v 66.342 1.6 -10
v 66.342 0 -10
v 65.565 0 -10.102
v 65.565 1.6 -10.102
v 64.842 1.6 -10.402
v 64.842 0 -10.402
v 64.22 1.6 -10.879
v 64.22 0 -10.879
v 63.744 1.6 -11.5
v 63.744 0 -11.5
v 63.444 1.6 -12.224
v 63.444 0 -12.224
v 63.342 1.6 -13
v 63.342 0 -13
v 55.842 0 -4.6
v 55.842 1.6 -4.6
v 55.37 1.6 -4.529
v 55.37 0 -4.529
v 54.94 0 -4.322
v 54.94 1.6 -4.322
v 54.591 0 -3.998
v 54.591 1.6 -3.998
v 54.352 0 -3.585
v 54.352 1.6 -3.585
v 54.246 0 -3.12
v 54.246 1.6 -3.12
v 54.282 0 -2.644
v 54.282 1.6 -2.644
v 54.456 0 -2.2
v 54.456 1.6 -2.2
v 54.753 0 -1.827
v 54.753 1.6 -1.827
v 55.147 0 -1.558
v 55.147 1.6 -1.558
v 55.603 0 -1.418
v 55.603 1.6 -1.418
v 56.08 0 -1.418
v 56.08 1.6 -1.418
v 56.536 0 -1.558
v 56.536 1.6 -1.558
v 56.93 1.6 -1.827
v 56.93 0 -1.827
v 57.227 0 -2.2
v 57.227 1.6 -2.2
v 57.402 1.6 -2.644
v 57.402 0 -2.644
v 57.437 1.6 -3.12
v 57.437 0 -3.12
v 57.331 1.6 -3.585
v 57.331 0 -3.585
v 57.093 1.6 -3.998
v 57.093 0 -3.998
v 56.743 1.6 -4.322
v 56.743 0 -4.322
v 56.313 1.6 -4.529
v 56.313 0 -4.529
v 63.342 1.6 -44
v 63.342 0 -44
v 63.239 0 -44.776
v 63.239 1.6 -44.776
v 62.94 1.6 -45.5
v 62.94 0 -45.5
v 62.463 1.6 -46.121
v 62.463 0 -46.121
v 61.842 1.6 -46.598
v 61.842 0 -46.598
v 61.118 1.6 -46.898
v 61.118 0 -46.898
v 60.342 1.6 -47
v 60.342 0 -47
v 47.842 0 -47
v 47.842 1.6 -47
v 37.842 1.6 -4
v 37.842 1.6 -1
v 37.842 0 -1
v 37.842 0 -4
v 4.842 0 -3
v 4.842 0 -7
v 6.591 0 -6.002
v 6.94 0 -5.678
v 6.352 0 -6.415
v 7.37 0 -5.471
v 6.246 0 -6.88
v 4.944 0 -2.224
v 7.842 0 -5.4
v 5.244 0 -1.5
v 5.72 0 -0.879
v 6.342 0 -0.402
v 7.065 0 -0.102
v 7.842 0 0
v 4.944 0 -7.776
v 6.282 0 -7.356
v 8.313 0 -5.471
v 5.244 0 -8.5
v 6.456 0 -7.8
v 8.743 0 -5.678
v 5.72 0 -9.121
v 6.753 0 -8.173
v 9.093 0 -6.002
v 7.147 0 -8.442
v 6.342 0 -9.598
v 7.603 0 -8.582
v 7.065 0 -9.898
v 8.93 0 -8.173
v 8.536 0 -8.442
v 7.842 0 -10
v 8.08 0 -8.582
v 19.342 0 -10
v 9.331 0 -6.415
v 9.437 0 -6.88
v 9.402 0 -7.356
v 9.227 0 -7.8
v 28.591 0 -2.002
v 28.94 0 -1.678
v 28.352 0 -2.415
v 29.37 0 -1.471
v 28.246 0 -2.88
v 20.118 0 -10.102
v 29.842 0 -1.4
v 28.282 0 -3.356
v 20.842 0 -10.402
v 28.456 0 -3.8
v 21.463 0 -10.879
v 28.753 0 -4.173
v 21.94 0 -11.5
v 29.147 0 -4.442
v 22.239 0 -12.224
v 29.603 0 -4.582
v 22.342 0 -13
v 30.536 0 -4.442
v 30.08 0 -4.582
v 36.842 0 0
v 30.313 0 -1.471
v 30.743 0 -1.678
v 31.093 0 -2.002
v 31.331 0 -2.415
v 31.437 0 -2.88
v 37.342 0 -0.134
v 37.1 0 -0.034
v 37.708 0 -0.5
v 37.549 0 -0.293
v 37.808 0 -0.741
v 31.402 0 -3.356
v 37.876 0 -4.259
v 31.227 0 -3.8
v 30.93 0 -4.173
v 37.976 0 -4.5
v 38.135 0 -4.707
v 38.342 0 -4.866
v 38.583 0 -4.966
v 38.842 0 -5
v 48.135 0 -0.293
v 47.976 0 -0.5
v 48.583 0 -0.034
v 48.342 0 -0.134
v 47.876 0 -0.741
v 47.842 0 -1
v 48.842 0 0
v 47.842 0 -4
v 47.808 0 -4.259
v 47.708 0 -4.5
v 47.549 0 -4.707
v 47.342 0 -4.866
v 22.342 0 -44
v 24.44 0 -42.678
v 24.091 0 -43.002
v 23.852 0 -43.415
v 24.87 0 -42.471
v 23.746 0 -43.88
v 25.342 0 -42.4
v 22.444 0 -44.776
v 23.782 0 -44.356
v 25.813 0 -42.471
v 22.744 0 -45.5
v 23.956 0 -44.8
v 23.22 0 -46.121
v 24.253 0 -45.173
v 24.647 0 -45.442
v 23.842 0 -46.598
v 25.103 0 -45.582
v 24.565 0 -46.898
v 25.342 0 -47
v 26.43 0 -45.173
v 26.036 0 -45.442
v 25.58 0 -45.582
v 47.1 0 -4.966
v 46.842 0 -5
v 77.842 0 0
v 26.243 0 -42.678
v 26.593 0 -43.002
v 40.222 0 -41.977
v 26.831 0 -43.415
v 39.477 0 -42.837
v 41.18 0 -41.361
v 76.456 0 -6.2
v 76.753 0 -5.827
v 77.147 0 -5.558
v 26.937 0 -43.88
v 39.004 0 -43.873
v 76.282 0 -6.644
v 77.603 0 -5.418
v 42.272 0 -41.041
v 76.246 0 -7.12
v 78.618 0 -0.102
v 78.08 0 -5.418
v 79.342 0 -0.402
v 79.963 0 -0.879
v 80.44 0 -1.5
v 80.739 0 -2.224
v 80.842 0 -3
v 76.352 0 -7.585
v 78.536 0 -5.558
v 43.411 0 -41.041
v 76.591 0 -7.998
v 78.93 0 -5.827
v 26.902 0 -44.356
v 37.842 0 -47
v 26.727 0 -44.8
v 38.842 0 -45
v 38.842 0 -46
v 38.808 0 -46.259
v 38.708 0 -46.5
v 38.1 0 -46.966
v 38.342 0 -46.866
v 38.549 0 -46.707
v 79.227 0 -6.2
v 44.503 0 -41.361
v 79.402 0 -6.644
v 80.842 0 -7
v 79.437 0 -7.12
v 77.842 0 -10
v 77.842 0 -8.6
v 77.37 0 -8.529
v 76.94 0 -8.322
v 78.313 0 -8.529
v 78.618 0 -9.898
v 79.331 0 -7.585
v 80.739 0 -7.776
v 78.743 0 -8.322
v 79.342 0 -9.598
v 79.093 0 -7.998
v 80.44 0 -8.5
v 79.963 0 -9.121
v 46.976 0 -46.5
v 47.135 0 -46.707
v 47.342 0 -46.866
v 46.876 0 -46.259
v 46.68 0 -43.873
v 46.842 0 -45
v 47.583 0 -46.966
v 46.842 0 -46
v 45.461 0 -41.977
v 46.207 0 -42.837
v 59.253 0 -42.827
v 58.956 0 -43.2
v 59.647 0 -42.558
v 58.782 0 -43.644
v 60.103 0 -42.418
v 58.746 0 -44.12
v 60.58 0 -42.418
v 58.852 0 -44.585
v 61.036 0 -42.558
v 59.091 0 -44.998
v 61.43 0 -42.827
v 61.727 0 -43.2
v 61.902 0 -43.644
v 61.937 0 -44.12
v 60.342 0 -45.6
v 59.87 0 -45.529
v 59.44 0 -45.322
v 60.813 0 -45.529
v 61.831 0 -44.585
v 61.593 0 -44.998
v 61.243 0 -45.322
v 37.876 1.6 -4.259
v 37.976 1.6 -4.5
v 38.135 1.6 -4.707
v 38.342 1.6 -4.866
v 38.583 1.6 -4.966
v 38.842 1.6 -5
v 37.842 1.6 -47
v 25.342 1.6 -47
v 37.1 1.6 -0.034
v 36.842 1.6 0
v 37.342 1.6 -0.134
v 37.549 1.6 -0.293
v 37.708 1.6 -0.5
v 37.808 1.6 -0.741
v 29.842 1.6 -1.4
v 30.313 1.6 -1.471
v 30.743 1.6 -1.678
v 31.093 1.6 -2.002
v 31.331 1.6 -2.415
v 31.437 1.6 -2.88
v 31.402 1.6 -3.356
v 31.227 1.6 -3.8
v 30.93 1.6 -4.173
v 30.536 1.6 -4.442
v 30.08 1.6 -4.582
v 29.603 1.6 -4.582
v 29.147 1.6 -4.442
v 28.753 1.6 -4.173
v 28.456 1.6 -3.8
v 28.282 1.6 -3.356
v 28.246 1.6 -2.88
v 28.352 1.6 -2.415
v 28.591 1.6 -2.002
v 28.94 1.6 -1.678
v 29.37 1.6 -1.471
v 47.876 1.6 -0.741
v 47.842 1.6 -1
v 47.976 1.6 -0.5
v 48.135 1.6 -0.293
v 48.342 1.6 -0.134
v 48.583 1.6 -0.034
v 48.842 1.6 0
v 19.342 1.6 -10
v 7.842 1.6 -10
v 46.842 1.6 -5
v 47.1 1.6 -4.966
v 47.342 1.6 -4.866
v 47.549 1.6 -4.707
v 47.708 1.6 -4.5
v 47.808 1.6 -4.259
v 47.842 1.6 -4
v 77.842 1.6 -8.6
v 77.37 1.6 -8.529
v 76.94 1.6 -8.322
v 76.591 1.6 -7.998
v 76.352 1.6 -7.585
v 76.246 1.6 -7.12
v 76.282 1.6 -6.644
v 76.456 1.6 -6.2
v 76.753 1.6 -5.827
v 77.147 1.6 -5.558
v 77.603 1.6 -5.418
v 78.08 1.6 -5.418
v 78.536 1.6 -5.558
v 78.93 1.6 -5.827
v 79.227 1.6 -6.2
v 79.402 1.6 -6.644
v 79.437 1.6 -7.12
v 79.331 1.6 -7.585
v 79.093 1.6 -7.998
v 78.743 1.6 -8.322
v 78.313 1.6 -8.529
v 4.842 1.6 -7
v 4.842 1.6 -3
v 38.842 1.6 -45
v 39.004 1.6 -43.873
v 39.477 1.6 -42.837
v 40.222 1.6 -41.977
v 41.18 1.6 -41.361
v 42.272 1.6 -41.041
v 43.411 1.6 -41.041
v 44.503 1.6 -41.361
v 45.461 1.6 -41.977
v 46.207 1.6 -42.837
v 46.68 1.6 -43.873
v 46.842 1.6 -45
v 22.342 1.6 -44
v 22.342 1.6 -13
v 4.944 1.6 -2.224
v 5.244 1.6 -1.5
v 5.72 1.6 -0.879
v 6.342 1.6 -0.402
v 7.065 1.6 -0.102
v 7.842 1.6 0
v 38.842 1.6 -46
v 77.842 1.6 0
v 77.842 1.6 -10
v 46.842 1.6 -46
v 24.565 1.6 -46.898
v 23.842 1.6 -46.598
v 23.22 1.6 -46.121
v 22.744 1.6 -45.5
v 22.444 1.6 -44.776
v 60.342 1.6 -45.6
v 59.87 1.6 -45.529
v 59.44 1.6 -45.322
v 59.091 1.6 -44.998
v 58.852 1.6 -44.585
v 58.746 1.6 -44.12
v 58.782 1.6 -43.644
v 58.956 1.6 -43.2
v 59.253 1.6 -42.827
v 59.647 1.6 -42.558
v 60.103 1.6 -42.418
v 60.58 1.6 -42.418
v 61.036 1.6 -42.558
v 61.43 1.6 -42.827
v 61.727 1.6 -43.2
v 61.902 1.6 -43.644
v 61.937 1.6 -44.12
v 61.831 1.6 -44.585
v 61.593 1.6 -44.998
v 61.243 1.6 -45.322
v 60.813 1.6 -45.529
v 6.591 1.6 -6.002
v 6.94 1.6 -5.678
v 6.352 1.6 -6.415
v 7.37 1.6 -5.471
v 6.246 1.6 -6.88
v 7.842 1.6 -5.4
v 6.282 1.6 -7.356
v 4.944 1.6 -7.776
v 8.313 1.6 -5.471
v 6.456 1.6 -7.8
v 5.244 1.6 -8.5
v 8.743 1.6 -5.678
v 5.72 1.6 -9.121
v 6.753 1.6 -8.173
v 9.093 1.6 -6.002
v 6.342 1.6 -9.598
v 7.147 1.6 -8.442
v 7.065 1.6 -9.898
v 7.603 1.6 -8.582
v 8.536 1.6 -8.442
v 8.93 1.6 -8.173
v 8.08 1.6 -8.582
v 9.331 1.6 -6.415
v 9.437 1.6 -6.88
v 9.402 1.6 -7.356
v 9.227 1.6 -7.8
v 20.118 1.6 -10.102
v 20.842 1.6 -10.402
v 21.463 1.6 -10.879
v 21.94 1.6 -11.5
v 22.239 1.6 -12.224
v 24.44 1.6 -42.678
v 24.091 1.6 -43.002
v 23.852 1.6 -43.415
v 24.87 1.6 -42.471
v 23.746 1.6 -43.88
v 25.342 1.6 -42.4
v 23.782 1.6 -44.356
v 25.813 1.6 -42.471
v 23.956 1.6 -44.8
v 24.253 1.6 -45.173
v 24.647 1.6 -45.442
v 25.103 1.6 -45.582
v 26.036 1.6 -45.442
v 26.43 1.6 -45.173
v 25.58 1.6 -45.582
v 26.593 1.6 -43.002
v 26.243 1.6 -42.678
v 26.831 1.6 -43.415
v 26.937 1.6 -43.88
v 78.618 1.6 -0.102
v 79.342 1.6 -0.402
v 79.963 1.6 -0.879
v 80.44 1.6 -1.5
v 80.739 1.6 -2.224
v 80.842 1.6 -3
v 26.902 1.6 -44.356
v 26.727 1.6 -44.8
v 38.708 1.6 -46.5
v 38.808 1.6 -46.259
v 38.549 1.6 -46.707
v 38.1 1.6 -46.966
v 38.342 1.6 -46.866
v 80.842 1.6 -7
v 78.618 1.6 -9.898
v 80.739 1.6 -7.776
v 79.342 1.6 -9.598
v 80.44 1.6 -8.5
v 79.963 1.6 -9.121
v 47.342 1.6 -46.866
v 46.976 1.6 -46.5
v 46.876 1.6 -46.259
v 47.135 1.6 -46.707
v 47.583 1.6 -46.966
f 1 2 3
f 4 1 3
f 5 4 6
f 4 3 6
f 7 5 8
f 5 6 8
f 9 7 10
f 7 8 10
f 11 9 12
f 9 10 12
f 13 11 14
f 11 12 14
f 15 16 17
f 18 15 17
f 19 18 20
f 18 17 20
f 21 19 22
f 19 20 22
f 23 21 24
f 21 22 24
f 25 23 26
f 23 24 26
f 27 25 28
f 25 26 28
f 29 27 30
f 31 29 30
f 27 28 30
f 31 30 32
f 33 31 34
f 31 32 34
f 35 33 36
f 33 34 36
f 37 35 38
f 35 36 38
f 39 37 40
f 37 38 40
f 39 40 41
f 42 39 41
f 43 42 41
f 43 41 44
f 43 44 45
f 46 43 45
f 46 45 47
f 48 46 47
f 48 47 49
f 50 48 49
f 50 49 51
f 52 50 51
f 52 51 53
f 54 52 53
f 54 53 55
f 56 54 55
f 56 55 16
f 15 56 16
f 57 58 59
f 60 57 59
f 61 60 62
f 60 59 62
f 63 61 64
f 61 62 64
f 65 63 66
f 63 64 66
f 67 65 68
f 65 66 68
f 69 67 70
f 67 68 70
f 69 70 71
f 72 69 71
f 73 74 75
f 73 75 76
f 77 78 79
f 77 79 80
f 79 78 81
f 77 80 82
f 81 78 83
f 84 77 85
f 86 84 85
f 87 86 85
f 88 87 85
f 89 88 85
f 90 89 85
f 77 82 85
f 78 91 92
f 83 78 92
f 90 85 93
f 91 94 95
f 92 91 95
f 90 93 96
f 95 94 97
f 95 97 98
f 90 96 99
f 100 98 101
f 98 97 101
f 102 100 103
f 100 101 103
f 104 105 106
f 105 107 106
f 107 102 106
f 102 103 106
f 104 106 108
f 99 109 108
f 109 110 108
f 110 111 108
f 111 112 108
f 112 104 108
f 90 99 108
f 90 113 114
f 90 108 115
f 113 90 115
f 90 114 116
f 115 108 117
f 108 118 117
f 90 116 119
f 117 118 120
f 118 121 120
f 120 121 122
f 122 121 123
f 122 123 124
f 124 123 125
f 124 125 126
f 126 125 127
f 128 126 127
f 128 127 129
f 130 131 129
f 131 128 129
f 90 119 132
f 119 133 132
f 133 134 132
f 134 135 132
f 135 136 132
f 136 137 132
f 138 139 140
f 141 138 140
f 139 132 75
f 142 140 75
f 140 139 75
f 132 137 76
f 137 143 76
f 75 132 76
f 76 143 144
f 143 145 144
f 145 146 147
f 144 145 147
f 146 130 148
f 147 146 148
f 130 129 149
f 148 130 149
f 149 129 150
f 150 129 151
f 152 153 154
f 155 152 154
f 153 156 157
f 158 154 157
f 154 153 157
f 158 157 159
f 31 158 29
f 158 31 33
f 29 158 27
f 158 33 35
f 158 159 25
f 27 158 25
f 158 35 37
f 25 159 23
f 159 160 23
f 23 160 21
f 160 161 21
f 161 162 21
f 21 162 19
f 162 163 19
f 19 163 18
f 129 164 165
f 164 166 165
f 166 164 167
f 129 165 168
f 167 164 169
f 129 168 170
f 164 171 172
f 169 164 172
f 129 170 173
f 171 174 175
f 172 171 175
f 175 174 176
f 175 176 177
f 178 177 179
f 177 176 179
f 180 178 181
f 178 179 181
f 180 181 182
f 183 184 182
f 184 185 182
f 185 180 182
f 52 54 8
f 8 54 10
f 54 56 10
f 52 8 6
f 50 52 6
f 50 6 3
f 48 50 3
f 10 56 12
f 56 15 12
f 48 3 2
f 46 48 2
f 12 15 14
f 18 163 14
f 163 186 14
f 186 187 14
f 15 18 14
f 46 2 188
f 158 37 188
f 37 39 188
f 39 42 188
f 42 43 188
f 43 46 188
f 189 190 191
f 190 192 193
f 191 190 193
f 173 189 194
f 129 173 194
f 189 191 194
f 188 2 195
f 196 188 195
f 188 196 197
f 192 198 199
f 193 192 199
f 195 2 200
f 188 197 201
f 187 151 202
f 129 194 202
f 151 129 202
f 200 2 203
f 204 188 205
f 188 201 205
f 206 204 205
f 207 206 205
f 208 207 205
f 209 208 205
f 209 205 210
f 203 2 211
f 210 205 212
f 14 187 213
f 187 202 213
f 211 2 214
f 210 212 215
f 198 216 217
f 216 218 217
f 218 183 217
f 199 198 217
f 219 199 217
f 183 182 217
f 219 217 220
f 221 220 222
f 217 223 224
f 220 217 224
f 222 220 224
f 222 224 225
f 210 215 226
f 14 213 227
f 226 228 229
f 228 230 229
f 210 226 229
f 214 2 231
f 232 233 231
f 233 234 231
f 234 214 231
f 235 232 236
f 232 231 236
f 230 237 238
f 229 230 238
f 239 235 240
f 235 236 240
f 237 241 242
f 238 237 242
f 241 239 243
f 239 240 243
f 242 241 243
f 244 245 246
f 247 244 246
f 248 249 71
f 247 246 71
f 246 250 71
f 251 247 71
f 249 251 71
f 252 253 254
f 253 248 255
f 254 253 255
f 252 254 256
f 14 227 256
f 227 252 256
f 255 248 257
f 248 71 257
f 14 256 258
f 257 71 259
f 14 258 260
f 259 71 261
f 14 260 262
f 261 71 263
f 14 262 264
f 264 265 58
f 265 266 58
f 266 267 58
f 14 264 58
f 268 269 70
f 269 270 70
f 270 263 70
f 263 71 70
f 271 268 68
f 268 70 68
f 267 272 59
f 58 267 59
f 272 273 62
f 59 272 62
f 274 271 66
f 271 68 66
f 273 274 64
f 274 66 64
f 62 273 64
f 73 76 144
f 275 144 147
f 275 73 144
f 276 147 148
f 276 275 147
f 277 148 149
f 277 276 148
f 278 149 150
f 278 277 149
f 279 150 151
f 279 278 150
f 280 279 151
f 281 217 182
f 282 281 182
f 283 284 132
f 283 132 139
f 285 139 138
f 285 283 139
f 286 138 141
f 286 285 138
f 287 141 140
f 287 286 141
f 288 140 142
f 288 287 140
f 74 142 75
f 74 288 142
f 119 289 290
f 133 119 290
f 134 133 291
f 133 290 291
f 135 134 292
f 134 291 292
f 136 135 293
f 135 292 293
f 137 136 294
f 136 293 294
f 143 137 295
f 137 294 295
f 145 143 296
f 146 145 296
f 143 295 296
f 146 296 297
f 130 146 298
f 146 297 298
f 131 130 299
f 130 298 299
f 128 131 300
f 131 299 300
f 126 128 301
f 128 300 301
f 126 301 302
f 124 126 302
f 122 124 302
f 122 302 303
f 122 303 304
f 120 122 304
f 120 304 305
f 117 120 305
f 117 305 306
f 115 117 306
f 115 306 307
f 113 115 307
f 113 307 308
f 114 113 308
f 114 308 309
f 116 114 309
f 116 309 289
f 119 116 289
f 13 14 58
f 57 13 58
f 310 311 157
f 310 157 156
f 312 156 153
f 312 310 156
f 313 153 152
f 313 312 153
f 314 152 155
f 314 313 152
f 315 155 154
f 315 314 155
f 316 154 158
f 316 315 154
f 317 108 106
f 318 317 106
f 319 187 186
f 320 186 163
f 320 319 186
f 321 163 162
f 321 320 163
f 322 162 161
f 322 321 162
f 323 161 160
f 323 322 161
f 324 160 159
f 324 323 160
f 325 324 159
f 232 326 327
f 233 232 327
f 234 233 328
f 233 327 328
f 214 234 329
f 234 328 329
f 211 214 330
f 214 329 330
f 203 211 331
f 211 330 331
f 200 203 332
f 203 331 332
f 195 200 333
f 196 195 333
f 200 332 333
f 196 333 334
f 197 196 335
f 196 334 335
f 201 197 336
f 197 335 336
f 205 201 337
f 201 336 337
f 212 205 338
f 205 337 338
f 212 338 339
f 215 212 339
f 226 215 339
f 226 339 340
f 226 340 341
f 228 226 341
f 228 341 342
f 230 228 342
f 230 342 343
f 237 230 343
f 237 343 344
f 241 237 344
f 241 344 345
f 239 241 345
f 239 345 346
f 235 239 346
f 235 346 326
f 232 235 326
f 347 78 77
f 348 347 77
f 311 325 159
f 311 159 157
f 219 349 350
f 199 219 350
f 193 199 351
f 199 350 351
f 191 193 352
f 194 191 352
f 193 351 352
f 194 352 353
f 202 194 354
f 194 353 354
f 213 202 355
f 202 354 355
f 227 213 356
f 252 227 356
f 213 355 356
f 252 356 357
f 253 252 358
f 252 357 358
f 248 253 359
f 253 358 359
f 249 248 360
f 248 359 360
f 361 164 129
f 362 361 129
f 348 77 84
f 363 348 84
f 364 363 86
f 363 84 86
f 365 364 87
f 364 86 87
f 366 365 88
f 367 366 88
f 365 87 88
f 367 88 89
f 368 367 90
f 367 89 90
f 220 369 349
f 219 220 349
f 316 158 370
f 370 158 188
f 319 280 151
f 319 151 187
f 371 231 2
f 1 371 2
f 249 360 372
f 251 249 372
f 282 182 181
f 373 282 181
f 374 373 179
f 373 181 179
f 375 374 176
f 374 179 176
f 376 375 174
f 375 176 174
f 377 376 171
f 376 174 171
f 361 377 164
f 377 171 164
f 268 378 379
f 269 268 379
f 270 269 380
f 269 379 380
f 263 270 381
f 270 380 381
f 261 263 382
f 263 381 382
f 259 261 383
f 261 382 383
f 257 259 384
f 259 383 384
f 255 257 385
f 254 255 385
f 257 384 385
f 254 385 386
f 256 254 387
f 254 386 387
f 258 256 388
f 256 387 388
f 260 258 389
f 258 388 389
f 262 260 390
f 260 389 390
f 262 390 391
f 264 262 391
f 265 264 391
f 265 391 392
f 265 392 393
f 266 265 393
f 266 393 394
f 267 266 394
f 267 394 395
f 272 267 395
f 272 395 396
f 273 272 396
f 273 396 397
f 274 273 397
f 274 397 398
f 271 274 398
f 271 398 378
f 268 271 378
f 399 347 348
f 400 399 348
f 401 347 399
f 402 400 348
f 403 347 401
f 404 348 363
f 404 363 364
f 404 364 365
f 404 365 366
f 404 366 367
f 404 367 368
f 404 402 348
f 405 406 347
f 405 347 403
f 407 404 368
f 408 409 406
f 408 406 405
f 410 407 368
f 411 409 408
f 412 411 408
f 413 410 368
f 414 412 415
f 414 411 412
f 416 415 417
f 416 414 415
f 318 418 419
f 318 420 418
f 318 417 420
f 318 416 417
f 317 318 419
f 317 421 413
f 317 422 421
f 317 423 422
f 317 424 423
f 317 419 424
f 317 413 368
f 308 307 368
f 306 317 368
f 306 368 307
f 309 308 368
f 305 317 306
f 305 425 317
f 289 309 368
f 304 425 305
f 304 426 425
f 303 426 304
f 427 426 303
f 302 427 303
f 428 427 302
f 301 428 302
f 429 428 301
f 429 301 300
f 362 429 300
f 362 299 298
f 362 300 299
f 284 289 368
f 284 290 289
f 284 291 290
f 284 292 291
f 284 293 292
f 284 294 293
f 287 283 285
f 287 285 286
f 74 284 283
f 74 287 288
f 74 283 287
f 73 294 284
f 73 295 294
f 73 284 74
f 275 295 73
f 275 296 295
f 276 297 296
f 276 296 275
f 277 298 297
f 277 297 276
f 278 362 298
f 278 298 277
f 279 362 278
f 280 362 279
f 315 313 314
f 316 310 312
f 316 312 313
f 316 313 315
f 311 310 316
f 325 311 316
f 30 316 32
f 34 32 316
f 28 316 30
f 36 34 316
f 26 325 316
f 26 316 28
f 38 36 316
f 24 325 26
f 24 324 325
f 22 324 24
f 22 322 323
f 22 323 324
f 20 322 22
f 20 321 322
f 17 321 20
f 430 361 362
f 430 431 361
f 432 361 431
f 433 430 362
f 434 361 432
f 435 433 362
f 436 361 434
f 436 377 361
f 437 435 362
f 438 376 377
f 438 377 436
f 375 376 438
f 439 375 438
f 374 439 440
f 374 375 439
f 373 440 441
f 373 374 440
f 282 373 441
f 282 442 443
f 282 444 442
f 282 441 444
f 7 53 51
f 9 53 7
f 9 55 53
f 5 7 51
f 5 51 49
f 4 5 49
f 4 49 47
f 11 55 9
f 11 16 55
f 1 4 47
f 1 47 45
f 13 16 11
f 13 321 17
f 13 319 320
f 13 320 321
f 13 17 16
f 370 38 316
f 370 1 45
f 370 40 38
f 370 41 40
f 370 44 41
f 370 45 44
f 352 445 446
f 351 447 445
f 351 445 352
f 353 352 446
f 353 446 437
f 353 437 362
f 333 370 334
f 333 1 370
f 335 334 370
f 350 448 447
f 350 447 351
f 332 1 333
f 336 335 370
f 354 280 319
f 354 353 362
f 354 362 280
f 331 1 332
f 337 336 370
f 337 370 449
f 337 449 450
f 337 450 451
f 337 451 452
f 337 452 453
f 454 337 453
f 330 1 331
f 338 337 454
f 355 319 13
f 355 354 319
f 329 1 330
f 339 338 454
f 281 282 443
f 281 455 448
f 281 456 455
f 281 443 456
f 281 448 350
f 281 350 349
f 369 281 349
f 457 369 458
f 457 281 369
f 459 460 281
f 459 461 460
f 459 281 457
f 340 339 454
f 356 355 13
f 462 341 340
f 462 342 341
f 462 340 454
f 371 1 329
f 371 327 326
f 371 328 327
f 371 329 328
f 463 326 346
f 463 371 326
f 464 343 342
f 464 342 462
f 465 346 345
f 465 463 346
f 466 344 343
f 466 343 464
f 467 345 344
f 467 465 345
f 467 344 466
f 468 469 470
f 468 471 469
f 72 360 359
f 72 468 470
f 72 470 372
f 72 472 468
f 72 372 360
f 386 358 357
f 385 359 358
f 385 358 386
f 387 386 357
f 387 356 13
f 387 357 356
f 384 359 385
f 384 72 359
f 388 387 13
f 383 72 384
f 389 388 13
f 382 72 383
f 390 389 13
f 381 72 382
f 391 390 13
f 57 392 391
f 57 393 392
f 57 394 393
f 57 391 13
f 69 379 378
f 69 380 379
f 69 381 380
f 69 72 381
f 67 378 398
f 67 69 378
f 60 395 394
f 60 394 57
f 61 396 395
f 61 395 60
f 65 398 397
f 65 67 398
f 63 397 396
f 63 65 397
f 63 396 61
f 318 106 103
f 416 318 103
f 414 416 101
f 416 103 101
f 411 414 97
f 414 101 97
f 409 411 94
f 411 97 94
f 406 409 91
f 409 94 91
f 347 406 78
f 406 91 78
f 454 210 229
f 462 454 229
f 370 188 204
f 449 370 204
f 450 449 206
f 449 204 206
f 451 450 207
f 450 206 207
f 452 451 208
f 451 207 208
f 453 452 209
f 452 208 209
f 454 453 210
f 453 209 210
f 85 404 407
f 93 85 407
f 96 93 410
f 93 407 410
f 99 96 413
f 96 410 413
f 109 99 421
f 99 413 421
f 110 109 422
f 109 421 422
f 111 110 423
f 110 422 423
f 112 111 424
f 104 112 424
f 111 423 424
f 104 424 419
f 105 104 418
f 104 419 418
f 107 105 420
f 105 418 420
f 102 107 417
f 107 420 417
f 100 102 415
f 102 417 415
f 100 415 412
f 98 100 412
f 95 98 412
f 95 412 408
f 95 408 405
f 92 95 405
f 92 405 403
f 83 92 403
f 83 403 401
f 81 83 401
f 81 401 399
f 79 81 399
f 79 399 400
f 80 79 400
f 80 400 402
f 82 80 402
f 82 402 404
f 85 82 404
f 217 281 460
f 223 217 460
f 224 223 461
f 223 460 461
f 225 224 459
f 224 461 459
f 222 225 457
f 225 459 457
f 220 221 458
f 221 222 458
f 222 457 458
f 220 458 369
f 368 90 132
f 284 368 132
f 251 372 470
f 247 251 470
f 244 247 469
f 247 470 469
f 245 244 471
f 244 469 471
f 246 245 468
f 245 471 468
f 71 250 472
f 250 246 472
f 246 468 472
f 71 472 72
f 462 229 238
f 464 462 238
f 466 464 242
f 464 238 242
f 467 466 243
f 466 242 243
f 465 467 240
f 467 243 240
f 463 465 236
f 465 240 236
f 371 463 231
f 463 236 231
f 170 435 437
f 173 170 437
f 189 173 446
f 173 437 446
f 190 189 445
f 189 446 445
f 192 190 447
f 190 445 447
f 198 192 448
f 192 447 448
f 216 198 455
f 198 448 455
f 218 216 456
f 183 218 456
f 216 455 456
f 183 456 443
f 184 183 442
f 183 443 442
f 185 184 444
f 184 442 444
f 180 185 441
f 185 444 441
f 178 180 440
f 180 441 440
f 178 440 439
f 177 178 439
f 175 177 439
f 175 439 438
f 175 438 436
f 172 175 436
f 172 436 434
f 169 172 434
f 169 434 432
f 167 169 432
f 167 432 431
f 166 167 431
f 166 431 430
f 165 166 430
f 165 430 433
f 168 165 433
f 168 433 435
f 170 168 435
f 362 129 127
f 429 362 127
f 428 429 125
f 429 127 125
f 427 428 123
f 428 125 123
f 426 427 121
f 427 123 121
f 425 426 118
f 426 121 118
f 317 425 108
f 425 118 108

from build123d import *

# Parameters (mm, degrees)
EXTRUDE_1_DEPTH     = 1.6
CUT_EXTRUDE_1_DEPTH = 10
SKETCH_3_R          = 1.6
CUT_EXTRUDE_2_DEPTH = 94.525061209
CUT_EXTRUDE_3_DEPTH = 5


with BuildPart() as part:
    # 草图1 → 凸台-拉伸1 (new body)
    with BuildSketch(Plane(origin=(0, 0, 0), x_dir=(1, 0, 0), z_dir=(0, 1, 0))):
        with BuildLine():
            Line((7.841679065, 0), (77.841679065, 0))
            ThreePointArc((77.841679065, 0), (79.962999409, 0.878679656), (80.841679065, 3))
            Line((80.841679065, 3), (80.841679065, 7))
            ThreePointArc((80.841679065, 7), (79.962999409, 9.121320344), (77.841679065, 10))
            Line((77.841679065, 10), (66.341679065, 10))
            ThreePointArc((66.341679065, 10), (64.220358721, 10.878679656), (63.341679065, 13))
            Line((63.341679065, 13), (63.341679065, 44))
            ThreePointArc((63.341679065, 44), (62.462999409, 46.121320344), (60.341679065, 47))
            Line((60.341679065, 47), (25.341679065, 47))
            ThreePointArc((25.341679065, 47), (23.220358721, 46.121320344), (22.341679065, 44))
            Line((22.341679065, 44), (22.341679065, 13))
            ThreePointArc((22.341679065, 13), (21.462999409, 10.878679656), (19.341679065, 10))
            Line((19.341679065, 10), (7.841679065, 10))
            ThreePointArc((7.841679065, 10), (5.720358721, 9.121320344), (4.841679065, 7))
            Line((4.841679065, 7), (4.841679065, 3))
            ThreePointArc((4.841679065, 3), (5.720358721, 0.878679656), (7.841679065, 0))
        make_face()
    extrude(amount=EXTRUDE_1_DEPTH)

    # 草图2 → 切除-拉伸1 (cut)
    with BuildSketch(Plane(origin=(0, 1.6, 0), x_dir=(1, 0, 0), z_dir=(0, 1, 0))):
        with BuildLine():
            Line((37.841679065, 1), (37.841679065, 4))
            ThreePointArc((37.841679065, 4), (38.134572284, 4.707106781), (38.841679065, 5))
            Line((38.841679065, 5), (46.841679065, 5))
            ThreePointArc((46.841679065, 5), (47.548785846, 4.707106781), (47.841679065, 4))
            Line((47.841679065, 4), (47.841679065, 1))
            ThreePointArc((47.841679065, 1), (48.134572284, 0.292893219), (48.841679065, 0))
            Line((48.841679065, 0), (36.841679065, 0))
            ThreePointArc((36.841679065, 0), (37.548785846, 0.292893219), (37.841679065, 1))
        make_face()
    extrude(amount=-CUT_EXTRUDE_1_DEPTH, mode=Mode.SUBTRACT)

    # 草图3 → 切除-拉伸2 (cut, through all)
    with BuildSketch(Plane(origin=(0, 1.6, 0), x_dir=(1, 0, 0), z_dir=(0, 1, 0))):
        with Locations(Location((7.841679065, 7, 0), (0, 0, 270))):
            Circle(SKETCH_3_R)
        with Locations(Location((29.841679065, 3, 0), (0, 0, 270))):
            Circle(SKETCH_3_R)
        with Locations(Location((25.341679065, 44, 0), (0, 0, 270))):
            Circle(SKETCH_3_R)
        with Locations(Location((60.341679065, 44, 0), (0, 0, 90))):
            Circle(SKETCH_3_R)
        with Locations(Location((55.841679065, 3, 0), (0, 0, 90))):
            Circle(SKETCH_3_R)
        with Locations(Location((77.841679065, 7, 0), (0, 0, 90))):
            Circle(SKETCH_3_R)
    extrude(amount=-CUT_EXTRUDE_2_DEPTH, mode=Mode.SUBTRACT)

    # 草图4 → 切除-拉伸3 (cut)
    with BuildSketch(Plane(origin=(0, 1.6, 0), x_dir=(1, 0, 0), z_dir=(0, 1, 0))):
        with BuildLine():
            Line((46.841679065, 45), (46.841679065, 46))
            ThreePointArc((46.841679065, 46), (47.134572284, 46.707106781), (47.841679065, 47))
            Line((47.841679065, 47), (37.841679065, 47))
            ThreePointArc((37.841679065, 47), (38.548785846, 46.707106781), (38.841679065, 46))
            Line((38.841679065, 46), (38.841679065, 45))
            ThreePointArc((38.841679065, 45), (42.841679065, 41), (46.841679065, 45))
        make_face()
    extrude(amount=-CUT_EXTRUDE_3_DEPTH, mode=Mode.SUBTRACT)


solid = part.part
